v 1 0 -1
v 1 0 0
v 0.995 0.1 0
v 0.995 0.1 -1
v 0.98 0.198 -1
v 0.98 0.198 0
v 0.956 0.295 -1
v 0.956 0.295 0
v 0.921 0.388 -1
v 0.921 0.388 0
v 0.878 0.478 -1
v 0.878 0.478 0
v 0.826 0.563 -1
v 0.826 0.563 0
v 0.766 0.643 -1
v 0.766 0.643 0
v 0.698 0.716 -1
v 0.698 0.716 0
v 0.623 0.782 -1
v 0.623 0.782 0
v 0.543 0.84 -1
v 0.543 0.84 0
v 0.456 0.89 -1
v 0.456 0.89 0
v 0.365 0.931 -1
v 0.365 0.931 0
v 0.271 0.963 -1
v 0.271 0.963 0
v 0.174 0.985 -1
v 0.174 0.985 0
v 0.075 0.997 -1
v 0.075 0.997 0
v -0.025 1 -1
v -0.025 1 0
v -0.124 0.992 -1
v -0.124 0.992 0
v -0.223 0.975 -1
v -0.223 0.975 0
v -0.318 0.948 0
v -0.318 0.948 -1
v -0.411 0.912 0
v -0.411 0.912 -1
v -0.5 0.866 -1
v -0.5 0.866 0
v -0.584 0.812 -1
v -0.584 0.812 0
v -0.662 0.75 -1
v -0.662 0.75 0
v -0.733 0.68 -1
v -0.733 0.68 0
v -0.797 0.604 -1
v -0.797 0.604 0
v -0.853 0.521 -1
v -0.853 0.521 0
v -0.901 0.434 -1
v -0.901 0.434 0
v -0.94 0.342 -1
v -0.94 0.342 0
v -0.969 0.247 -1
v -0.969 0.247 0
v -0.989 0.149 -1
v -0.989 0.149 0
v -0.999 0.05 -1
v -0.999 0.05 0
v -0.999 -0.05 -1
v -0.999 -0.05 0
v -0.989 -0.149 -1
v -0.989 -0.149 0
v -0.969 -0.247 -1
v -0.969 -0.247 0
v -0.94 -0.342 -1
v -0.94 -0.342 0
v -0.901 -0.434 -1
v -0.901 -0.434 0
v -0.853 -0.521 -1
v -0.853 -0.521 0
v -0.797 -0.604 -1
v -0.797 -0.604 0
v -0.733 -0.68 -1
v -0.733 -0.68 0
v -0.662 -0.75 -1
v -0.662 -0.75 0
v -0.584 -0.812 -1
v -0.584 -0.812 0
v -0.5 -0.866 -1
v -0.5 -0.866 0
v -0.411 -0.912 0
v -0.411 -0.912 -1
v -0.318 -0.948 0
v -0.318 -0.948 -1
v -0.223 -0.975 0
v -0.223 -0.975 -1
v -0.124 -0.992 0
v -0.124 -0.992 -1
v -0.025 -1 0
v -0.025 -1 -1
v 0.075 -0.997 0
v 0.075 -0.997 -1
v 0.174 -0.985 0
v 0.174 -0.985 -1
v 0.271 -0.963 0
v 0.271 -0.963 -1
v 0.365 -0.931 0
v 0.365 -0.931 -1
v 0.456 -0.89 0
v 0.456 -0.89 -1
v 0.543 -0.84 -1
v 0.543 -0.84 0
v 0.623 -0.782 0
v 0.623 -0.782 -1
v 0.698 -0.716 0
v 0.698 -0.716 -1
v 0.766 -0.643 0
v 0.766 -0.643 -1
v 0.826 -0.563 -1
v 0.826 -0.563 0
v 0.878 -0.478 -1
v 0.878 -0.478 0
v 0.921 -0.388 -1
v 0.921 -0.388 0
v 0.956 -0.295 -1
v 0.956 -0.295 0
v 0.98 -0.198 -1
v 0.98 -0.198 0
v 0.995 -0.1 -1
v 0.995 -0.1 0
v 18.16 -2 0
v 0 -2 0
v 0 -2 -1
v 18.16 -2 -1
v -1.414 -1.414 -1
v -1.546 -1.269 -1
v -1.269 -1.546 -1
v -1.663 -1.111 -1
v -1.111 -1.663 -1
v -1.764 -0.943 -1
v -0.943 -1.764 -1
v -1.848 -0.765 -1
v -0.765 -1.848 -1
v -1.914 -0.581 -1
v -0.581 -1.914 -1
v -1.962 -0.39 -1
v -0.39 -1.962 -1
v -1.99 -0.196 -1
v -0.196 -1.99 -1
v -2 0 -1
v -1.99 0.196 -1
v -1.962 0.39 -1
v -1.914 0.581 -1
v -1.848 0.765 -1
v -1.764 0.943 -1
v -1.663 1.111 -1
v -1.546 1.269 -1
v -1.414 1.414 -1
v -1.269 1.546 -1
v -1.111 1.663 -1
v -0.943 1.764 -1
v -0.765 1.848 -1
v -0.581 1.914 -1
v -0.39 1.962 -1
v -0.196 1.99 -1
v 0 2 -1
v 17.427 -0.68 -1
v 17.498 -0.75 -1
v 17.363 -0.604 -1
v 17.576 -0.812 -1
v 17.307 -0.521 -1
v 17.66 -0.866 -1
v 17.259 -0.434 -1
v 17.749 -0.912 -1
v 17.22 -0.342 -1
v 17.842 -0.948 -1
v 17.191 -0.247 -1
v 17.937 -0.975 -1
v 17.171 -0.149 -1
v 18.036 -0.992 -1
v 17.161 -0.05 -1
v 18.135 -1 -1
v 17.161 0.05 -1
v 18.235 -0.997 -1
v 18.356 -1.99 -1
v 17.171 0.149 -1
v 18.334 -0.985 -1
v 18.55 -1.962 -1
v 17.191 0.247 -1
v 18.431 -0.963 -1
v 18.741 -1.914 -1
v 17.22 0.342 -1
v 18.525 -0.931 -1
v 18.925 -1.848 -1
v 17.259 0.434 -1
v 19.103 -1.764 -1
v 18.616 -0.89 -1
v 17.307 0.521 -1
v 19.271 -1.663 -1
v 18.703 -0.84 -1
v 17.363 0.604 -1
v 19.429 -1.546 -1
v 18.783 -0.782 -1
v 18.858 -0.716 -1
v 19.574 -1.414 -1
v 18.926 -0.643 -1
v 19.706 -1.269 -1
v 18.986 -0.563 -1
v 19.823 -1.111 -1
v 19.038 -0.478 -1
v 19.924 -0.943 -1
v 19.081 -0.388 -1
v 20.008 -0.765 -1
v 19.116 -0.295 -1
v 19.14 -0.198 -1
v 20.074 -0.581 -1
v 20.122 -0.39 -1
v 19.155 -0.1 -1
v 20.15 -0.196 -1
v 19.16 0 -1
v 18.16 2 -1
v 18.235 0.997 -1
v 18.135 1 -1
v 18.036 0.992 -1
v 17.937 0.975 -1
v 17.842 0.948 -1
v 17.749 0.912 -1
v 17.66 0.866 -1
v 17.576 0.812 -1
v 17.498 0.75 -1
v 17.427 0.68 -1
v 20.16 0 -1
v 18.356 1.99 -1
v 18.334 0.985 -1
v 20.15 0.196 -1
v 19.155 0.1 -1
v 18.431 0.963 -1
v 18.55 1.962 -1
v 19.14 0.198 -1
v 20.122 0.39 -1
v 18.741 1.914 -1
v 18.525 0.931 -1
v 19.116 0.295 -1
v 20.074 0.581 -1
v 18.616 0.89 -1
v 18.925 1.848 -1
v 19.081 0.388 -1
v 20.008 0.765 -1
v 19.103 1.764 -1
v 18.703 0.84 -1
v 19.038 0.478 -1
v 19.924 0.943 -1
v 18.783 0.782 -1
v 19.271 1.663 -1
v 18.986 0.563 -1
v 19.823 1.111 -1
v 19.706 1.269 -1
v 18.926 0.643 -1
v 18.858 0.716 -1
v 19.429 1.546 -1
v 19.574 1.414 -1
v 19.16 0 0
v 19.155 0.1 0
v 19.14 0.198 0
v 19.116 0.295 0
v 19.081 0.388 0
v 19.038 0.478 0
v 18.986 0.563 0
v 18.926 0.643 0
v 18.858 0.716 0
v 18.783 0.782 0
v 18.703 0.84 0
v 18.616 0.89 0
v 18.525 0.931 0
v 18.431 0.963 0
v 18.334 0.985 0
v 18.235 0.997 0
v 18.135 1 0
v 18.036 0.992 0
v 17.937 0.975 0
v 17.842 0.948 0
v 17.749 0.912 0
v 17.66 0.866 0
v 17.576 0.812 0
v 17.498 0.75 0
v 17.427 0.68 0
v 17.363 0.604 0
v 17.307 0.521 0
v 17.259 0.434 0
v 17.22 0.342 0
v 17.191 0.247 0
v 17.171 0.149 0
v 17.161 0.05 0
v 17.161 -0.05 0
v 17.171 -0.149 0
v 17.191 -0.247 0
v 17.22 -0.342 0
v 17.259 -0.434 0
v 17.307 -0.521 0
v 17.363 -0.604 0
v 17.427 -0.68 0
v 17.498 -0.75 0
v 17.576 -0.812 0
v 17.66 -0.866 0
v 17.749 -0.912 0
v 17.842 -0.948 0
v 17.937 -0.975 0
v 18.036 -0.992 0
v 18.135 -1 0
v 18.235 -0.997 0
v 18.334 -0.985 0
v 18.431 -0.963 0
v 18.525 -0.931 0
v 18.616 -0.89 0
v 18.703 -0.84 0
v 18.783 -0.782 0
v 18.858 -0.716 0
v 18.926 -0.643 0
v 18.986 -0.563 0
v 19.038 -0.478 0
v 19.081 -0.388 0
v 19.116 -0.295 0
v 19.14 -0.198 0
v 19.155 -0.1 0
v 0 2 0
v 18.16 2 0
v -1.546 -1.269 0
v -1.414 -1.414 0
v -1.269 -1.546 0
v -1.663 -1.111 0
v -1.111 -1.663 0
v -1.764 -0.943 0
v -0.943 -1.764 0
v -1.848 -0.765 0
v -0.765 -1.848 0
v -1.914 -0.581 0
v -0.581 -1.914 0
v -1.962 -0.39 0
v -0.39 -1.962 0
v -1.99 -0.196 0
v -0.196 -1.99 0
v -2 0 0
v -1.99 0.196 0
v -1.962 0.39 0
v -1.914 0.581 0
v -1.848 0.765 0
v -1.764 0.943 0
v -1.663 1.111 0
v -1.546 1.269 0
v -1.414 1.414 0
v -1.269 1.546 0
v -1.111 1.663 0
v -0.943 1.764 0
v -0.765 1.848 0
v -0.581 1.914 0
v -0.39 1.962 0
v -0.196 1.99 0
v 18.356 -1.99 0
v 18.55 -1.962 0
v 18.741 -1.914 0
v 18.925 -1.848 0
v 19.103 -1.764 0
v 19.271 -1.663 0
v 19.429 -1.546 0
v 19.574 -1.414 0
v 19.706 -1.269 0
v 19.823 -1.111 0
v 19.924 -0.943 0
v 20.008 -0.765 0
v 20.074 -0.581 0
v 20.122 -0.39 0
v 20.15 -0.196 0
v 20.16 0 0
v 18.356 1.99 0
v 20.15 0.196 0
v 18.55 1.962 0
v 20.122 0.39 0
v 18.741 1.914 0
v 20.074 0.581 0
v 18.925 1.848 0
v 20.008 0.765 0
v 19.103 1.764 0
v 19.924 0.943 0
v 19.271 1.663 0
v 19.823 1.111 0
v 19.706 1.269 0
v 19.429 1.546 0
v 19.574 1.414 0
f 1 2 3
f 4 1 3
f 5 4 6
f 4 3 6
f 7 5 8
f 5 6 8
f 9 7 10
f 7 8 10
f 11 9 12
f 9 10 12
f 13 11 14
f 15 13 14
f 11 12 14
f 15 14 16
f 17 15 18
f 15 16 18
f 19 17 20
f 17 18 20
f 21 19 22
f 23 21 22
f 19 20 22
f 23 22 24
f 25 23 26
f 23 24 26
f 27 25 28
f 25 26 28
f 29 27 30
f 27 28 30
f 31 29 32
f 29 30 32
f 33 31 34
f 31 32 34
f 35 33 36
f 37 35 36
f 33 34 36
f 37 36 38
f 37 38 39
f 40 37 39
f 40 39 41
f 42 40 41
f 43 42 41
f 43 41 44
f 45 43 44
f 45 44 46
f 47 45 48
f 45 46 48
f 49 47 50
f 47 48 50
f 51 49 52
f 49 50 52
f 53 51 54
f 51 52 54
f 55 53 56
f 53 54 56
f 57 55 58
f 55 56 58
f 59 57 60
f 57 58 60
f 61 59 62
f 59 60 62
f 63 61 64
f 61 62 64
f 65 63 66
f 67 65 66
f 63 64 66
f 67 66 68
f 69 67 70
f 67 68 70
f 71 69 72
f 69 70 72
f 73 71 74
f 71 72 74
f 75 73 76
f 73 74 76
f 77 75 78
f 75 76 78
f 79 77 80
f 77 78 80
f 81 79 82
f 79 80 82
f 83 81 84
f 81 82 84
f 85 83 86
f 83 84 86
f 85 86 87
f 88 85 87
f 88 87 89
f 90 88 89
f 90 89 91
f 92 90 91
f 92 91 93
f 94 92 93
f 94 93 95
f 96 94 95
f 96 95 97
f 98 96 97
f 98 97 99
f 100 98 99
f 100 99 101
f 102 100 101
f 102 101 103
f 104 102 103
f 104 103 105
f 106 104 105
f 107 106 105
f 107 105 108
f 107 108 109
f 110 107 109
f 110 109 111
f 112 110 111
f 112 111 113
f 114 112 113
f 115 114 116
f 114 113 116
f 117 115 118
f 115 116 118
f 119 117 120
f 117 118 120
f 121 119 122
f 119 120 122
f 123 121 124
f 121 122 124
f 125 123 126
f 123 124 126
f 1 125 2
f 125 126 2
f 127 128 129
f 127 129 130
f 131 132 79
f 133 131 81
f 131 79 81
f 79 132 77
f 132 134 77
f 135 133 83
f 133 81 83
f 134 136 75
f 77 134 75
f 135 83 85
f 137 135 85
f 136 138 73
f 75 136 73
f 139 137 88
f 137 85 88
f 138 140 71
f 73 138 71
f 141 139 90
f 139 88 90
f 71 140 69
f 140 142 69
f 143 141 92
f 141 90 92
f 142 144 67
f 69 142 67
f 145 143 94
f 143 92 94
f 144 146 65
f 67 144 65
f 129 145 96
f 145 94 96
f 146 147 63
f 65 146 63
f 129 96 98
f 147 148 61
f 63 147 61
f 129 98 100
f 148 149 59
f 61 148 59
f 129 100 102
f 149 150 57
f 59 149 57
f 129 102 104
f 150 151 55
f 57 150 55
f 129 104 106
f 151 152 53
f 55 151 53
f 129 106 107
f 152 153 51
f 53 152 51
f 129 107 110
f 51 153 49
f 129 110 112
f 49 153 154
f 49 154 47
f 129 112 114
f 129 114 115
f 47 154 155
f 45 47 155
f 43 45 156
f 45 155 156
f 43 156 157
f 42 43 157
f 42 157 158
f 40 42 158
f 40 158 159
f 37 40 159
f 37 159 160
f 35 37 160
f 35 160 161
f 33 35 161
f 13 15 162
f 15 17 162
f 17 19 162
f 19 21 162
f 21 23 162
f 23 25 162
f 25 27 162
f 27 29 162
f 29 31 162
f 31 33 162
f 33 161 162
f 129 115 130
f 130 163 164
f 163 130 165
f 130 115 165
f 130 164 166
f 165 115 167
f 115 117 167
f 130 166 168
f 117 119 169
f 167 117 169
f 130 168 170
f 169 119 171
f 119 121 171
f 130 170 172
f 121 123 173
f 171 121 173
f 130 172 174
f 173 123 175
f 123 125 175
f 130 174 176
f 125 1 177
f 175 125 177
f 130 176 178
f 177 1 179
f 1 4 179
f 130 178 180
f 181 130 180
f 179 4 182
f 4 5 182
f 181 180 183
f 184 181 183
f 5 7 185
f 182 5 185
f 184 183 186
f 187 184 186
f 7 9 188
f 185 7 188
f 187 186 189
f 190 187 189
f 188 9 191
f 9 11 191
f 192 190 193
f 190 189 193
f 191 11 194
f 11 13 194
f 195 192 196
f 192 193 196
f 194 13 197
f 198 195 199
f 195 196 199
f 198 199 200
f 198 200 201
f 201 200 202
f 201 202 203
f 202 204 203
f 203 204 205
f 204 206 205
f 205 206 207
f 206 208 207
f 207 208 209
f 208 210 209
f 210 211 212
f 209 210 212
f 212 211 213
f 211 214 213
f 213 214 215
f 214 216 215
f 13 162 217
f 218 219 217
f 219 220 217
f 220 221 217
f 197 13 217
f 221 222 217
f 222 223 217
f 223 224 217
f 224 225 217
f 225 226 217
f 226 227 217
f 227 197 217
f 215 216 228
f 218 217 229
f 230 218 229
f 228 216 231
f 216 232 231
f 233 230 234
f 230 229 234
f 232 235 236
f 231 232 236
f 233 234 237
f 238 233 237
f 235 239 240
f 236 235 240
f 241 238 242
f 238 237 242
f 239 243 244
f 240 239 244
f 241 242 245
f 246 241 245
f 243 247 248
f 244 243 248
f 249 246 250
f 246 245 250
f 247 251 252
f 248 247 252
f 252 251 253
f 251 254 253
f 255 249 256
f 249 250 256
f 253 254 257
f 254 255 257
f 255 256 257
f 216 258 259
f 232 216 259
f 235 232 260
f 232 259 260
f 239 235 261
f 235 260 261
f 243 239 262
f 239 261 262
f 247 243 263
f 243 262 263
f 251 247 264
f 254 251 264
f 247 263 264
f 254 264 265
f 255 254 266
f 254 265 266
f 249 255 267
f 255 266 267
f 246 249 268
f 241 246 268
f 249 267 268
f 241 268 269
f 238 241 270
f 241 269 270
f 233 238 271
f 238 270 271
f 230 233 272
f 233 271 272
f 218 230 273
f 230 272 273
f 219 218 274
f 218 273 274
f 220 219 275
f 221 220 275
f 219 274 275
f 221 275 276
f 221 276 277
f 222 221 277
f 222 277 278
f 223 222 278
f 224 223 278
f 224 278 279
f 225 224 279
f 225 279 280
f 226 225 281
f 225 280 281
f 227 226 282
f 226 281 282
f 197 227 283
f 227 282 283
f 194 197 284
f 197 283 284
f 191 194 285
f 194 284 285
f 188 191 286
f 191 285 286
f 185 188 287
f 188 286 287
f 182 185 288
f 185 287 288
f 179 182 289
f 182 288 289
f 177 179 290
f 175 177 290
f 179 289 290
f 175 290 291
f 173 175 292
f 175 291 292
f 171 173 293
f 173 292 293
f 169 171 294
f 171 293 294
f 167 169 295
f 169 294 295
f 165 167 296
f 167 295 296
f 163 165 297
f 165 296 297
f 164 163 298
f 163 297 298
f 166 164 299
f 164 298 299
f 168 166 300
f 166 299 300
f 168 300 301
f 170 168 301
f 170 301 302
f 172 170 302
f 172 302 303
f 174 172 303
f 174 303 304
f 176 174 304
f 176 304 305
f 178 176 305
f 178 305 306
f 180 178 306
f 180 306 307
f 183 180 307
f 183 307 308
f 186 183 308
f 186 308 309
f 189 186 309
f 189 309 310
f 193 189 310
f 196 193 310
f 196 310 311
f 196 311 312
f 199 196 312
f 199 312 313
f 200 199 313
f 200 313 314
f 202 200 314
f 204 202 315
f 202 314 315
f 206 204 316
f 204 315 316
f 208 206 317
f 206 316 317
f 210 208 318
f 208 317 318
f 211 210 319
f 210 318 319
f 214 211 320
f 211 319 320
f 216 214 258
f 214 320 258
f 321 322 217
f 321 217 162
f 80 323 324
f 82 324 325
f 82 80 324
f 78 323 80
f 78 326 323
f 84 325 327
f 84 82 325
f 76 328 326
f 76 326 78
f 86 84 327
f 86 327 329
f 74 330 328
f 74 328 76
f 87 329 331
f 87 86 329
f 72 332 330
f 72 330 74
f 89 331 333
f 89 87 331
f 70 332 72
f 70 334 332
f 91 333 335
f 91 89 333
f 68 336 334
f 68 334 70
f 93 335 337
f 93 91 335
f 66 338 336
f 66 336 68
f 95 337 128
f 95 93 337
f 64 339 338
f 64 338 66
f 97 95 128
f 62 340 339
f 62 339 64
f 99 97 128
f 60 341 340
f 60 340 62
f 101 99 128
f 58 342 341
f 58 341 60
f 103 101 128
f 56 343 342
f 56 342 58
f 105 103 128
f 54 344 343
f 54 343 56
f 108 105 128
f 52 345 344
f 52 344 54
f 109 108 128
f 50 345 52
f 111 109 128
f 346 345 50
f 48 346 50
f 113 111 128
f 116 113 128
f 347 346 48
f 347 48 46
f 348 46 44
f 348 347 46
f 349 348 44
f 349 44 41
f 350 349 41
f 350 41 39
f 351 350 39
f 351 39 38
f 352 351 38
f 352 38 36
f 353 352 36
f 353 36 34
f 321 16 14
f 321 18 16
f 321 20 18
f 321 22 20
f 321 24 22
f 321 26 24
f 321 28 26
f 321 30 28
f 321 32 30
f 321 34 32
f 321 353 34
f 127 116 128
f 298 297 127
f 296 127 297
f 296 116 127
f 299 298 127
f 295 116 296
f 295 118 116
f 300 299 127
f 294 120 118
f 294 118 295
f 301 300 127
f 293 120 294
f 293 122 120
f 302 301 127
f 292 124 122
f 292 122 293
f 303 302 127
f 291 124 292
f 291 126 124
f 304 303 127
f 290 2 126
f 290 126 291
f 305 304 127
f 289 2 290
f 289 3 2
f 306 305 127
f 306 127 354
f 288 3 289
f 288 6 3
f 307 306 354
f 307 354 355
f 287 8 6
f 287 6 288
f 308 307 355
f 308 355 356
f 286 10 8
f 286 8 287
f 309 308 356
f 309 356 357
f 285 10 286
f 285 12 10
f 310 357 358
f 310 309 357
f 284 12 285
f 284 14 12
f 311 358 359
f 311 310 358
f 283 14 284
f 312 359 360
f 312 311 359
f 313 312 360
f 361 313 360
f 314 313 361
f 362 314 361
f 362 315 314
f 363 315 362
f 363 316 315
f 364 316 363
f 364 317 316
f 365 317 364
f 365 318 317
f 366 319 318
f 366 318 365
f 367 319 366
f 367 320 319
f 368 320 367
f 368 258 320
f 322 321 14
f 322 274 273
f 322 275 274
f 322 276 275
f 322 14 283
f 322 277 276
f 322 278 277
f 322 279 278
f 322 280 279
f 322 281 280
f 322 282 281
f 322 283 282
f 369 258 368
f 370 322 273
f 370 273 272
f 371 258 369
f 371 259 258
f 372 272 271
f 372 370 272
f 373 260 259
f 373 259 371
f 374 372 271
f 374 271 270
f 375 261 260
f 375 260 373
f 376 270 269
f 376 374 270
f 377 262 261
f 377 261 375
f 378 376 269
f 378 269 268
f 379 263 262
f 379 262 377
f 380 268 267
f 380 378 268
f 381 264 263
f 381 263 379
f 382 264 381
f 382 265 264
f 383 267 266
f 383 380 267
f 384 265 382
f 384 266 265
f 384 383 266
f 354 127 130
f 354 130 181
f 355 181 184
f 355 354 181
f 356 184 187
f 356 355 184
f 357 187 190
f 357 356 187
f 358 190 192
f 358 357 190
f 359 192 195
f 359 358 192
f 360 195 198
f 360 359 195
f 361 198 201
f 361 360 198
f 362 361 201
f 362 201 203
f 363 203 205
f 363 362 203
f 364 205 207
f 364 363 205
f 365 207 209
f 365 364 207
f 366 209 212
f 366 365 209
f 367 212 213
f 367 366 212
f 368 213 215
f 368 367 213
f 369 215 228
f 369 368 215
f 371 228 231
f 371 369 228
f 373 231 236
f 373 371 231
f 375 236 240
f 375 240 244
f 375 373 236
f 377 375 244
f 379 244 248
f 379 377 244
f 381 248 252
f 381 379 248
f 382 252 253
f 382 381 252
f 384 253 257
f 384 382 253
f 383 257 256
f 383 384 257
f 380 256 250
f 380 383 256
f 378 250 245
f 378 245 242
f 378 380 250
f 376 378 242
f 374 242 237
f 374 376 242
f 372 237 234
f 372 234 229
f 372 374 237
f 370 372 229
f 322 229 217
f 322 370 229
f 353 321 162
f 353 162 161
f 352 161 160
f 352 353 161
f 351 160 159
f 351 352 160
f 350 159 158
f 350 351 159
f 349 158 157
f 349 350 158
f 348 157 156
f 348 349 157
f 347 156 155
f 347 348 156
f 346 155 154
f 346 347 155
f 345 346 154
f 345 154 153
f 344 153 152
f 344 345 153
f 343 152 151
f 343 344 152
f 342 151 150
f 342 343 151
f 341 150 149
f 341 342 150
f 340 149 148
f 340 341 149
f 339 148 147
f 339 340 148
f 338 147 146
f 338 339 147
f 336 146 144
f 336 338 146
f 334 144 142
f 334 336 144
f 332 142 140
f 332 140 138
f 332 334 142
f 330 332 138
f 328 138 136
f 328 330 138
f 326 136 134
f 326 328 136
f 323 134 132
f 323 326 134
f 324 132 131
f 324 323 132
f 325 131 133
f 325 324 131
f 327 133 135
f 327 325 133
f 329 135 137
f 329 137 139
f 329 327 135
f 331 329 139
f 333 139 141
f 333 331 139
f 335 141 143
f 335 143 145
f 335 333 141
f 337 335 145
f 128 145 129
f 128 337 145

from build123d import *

# Parameters (mm, degrees)
SKETCH1_R      = 1
EXTRUDE1_DEPTH = 1


with BuildPart() as part:
    # Sketch1 → Extrude1 (new body)
    with BuildSketch(Plane.XY):
        with BuildLine():
            ThreePointArc((0, 2), (-2, 0), (0, -2))
            Line((0, -2), (18.16, -2))
            ThreePointArc((18.16, -2), (20.16, 0), (18.16, 2))
            Line((18.16, 2), (0, 2))
        make_face()
        Circle(SKETCH1_R, mode=Mode.SUBTRACT)
        with Locations((18.16, 0)):
            Circle(SKETCH1_R, mode=Mode.SUBTRACT)
    extrude(amount=-EXTRUDE1_DEPTH)


solid = part.part
